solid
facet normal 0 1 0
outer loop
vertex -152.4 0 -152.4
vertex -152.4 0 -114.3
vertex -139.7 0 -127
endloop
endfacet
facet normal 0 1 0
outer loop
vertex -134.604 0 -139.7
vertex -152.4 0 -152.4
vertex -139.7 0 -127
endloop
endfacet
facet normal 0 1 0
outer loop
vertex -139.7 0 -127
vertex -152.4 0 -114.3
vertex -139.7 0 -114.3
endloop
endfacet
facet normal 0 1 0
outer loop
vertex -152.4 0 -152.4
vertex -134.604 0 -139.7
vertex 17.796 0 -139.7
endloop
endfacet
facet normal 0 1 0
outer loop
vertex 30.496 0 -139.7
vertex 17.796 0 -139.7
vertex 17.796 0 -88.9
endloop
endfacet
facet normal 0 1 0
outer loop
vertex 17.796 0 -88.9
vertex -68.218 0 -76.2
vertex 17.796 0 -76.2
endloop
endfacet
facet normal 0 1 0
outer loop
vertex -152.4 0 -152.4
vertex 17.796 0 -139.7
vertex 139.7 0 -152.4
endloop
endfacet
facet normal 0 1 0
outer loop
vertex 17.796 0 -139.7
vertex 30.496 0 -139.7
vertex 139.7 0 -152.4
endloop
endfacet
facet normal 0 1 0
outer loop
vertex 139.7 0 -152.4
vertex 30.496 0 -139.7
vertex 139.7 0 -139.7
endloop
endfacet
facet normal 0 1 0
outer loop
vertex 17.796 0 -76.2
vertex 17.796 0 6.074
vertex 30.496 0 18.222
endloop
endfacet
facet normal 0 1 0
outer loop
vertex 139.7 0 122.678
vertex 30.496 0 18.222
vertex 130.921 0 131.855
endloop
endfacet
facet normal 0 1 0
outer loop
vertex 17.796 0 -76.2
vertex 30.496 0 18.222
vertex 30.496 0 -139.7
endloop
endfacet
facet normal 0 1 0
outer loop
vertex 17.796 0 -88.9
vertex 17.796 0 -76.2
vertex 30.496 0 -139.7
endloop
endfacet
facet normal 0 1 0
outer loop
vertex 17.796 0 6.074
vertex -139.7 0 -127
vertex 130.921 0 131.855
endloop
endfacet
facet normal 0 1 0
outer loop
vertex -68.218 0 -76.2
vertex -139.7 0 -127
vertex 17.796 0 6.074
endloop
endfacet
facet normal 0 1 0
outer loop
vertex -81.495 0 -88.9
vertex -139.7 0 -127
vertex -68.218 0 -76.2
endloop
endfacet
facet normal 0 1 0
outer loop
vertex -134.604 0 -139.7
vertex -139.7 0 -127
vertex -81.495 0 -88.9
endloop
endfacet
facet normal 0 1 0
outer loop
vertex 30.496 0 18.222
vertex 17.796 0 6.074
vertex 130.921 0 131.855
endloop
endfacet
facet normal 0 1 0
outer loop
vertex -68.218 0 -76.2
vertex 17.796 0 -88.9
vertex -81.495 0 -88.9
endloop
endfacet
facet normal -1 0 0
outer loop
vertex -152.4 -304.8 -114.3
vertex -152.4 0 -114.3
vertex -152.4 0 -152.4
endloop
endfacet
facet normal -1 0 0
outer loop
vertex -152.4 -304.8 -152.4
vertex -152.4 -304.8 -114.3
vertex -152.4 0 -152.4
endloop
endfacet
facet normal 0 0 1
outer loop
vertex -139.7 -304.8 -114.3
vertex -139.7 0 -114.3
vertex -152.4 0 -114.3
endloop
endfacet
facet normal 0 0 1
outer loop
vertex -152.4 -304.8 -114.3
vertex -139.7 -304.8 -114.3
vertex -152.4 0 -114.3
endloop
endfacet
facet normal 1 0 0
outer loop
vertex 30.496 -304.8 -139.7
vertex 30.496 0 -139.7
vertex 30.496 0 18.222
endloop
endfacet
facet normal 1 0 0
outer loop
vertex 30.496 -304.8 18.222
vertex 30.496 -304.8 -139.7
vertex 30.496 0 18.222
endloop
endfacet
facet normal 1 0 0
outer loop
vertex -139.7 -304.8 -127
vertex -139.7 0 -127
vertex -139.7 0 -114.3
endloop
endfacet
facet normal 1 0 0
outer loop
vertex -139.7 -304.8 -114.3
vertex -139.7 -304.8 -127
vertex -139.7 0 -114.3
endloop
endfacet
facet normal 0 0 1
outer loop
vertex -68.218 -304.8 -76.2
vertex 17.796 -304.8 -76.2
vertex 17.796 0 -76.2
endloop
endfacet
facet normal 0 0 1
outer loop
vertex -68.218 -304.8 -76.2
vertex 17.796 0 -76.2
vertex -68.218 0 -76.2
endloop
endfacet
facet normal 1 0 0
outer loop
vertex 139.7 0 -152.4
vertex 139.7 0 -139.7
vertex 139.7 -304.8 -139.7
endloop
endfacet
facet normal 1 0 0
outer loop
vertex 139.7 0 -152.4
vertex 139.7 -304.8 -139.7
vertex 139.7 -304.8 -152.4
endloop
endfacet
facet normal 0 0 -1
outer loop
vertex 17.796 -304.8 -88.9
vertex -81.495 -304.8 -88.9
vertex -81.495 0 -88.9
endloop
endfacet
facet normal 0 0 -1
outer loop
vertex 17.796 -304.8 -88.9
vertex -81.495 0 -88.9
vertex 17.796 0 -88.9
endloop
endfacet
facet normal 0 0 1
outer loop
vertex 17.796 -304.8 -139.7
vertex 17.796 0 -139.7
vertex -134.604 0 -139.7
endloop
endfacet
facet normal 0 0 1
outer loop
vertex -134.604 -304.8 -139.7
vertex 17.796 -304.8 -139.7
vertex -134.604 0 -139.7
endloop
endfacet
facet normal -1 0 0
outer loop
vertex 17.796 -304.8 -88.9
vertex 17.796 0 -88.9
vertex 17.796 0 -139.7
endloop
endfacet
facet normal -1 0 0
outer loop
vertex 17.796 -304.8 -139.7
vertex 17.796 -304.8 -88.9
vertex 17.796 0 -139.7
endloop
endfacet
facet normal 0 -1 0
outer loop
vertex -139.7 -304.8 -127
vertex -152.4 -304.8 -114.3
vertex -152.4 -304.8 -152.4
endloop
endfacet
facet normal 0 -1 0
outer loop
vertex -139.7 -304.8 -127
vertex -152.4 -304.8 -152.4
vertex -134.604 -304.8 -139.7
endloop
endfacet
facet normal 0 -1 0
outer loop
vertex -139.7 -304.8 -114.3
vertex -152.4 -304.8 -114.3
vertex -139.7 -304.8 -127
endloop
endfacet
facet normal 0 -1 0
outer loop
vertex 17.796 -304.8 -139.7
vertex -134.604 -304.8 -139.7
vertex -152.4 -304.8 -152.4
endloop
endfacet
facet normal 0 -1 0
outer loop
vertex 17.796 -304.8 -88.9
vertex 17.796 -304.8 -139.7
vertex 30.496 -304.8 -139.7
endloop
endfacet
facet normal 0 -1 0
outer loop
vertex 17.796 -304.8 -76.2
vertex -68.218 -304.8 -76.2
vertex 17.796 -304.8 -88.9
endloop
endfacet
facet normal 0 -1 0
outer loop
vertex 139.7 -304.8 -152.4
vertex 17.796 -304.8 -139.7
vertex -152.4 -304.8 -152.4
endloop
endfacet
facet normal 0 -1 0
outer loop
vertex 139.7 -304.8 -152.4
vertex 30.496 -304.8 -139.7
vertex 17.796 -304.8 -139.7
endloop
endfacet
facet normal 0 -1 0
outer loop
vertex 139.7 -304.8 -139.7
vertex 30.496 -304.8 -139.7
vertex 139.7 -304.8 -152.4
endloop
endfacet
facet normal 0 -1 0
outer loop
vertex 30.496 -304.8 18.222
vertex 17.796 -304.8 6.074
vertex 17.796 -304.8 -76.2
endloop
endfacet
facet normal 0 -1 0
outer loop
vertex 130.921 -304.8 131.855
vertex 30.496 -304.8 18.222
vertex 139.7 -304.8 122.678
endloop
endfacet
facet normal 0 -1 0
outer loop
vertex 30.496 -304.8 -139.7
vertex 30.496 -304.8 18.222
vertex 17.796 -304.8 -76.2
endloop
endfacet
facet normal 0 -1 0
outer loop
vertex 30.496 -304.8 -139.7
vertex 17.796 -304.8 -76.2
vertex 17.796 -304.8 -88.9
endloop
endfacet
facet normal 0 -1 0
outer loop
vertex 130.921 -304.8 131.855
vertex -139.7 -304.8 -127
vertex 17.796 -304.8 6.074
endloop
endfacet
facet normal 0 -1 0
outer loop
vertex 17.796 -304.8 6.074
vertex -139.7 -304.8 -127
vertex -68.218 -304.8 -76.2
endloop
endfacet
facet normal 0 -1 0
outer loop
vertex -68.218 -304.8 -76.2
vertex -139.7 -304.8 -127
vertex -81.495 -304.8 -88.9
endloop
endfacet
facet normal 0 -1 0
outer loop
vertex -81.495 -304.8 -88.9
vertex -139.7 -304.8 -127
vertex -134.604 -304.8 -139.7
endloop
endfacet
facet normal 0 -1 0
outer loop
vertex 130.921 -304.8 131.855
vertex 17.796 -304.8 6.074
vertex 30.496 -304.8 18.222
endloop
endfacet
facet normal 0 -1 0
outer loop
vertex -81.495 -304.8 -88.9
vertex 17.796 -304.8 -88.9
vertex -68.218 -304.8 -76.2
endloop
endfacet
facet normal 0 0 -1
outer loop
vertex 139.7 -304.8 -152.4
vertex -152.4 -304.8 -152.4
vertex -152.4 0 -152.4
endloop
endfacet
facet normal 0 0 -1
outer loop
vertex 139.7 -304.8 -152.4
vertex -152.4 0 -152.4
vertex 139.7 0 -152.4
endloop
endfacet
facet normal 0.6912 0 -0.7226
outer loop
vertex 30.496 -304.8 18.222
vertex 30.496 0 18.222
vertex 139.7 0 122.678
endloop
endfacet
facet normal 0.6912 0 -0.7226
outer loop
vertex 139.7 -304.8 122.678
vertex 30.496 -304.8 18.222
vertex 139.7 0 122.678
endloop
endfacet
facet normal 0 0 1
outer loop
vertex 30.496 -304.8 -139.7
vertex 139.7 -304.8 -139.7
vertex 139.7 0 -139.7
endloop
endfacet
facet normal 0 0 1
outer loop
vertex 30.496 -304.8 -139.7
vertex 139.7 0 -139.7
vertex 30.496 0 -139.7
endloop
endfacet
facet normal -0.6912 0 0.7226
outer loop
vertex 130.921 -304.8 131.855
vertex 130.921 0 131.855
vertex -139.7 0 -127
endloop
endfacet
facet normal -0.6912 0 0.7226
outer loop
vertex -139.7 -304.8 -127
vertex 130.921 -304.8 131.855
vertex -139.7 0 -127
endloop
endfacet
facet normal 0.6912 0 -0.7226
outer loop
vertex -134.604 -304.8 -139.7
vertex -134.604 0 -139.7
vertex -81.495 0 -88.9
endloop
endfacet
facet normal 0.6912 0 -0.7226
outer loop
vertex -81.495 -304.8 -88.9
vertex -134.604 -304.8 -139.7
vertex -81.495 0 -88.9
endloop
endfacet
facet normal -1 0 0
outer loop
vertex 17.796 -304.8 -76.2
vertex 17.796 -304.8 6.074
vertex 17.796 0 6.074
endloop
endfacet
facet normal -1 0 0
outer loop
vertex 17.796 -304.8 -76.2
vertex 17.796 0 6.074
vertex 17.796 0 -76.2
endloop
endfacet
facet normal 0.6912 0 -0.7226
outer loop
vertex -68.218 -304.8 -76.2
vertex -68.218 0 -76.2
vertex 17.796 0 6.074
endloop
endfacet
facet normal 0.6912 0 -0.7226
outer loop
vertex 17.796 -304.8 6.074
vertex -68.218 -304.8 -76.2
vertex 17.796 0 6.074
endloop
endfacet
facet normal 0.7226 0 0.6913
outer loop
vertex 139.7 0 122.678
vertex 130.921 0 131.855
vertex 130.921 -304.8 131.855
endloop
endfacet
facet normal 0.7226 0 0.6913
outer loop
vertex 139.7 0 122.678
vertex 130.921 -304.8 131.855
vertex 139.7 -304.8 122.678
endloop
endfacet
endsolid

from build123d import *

# Parameters (mm, degrees)
F1_DEPTH = 304.8
F3_DEPTH = 304.8
F5_DEPTH = 304.8


with BuildPart() as f1:
    # F0 (on Front) → F1 (new body)
    with BuildSketch(Plane.XZ):
        Polygon((-139.7, -114.3), (-152.4, -114.3), (-152.4, -152.4), (-139.7, -152.4), (-139.7, -139.7), (-139.7, -127), align=None)
        Polygon((15.1285276038, 3.5224484142), (6.35, 12.7), (-139.7, -127), (-139.7, -139.7), (-134.604032102, -139.7), align=None)
        Polygon((152.4, -152.4), (152.4, -139.7), (139.7, -139.7), (-134.604032102, -139.7), (-139.7, -139.7), (-139.7, -152.4), align=None)
        Polygon((139.7, 122.6777698367), (139.7, 140.252173913), (6.35, 12.7), (15.1285276038, 3.5224484142), align=None)
        Polygon((152.4, 134.8255959236), (152.4, 152.4), (139.7, 140.252173913), (139.7, 122.6777698367), align=None)
        Polygon((152.4, -139.7), (152.4, 134.8255959236), (139.7, 122.6777698367), (139.7, -139.7), align=None)
    extrude(amount=F1_DEPTH)

    # F2 (on face) → F3 (join)
    with BuildSketch(Plane.XZ.offset(304.8)):
        Polygon((-68.2176684656, -76.2), (-81.4949411929, -88.9), (17.795967898, -88.9), (17.795967898, -76.2), align=None)
        Polygon((17.795967898, -88.9), (17.795967898, -139.7), (30.495967898, -139.7), (30.495967898, 18.2217391304), (17.795967898, 6.0739130435), (17.795967898, -76.2), align=None)
    extrude(amount=-F3_DEPTH)

    # F4 (on face) → F5 (cut)
    with BuildSketch(Plane.XZ.offset(304.8)):
        Polygon((130.9214723962, 131.8553214225), (139.7, 122.6777698367), (139.7, -139.7), (139.7, -152.4), (152.4, -152.4), (152.4, 152.4), align=None)
    extrude(amount=-F5_DEPTH, mode=Mode.SUBTRACT)


solid = f1.part
